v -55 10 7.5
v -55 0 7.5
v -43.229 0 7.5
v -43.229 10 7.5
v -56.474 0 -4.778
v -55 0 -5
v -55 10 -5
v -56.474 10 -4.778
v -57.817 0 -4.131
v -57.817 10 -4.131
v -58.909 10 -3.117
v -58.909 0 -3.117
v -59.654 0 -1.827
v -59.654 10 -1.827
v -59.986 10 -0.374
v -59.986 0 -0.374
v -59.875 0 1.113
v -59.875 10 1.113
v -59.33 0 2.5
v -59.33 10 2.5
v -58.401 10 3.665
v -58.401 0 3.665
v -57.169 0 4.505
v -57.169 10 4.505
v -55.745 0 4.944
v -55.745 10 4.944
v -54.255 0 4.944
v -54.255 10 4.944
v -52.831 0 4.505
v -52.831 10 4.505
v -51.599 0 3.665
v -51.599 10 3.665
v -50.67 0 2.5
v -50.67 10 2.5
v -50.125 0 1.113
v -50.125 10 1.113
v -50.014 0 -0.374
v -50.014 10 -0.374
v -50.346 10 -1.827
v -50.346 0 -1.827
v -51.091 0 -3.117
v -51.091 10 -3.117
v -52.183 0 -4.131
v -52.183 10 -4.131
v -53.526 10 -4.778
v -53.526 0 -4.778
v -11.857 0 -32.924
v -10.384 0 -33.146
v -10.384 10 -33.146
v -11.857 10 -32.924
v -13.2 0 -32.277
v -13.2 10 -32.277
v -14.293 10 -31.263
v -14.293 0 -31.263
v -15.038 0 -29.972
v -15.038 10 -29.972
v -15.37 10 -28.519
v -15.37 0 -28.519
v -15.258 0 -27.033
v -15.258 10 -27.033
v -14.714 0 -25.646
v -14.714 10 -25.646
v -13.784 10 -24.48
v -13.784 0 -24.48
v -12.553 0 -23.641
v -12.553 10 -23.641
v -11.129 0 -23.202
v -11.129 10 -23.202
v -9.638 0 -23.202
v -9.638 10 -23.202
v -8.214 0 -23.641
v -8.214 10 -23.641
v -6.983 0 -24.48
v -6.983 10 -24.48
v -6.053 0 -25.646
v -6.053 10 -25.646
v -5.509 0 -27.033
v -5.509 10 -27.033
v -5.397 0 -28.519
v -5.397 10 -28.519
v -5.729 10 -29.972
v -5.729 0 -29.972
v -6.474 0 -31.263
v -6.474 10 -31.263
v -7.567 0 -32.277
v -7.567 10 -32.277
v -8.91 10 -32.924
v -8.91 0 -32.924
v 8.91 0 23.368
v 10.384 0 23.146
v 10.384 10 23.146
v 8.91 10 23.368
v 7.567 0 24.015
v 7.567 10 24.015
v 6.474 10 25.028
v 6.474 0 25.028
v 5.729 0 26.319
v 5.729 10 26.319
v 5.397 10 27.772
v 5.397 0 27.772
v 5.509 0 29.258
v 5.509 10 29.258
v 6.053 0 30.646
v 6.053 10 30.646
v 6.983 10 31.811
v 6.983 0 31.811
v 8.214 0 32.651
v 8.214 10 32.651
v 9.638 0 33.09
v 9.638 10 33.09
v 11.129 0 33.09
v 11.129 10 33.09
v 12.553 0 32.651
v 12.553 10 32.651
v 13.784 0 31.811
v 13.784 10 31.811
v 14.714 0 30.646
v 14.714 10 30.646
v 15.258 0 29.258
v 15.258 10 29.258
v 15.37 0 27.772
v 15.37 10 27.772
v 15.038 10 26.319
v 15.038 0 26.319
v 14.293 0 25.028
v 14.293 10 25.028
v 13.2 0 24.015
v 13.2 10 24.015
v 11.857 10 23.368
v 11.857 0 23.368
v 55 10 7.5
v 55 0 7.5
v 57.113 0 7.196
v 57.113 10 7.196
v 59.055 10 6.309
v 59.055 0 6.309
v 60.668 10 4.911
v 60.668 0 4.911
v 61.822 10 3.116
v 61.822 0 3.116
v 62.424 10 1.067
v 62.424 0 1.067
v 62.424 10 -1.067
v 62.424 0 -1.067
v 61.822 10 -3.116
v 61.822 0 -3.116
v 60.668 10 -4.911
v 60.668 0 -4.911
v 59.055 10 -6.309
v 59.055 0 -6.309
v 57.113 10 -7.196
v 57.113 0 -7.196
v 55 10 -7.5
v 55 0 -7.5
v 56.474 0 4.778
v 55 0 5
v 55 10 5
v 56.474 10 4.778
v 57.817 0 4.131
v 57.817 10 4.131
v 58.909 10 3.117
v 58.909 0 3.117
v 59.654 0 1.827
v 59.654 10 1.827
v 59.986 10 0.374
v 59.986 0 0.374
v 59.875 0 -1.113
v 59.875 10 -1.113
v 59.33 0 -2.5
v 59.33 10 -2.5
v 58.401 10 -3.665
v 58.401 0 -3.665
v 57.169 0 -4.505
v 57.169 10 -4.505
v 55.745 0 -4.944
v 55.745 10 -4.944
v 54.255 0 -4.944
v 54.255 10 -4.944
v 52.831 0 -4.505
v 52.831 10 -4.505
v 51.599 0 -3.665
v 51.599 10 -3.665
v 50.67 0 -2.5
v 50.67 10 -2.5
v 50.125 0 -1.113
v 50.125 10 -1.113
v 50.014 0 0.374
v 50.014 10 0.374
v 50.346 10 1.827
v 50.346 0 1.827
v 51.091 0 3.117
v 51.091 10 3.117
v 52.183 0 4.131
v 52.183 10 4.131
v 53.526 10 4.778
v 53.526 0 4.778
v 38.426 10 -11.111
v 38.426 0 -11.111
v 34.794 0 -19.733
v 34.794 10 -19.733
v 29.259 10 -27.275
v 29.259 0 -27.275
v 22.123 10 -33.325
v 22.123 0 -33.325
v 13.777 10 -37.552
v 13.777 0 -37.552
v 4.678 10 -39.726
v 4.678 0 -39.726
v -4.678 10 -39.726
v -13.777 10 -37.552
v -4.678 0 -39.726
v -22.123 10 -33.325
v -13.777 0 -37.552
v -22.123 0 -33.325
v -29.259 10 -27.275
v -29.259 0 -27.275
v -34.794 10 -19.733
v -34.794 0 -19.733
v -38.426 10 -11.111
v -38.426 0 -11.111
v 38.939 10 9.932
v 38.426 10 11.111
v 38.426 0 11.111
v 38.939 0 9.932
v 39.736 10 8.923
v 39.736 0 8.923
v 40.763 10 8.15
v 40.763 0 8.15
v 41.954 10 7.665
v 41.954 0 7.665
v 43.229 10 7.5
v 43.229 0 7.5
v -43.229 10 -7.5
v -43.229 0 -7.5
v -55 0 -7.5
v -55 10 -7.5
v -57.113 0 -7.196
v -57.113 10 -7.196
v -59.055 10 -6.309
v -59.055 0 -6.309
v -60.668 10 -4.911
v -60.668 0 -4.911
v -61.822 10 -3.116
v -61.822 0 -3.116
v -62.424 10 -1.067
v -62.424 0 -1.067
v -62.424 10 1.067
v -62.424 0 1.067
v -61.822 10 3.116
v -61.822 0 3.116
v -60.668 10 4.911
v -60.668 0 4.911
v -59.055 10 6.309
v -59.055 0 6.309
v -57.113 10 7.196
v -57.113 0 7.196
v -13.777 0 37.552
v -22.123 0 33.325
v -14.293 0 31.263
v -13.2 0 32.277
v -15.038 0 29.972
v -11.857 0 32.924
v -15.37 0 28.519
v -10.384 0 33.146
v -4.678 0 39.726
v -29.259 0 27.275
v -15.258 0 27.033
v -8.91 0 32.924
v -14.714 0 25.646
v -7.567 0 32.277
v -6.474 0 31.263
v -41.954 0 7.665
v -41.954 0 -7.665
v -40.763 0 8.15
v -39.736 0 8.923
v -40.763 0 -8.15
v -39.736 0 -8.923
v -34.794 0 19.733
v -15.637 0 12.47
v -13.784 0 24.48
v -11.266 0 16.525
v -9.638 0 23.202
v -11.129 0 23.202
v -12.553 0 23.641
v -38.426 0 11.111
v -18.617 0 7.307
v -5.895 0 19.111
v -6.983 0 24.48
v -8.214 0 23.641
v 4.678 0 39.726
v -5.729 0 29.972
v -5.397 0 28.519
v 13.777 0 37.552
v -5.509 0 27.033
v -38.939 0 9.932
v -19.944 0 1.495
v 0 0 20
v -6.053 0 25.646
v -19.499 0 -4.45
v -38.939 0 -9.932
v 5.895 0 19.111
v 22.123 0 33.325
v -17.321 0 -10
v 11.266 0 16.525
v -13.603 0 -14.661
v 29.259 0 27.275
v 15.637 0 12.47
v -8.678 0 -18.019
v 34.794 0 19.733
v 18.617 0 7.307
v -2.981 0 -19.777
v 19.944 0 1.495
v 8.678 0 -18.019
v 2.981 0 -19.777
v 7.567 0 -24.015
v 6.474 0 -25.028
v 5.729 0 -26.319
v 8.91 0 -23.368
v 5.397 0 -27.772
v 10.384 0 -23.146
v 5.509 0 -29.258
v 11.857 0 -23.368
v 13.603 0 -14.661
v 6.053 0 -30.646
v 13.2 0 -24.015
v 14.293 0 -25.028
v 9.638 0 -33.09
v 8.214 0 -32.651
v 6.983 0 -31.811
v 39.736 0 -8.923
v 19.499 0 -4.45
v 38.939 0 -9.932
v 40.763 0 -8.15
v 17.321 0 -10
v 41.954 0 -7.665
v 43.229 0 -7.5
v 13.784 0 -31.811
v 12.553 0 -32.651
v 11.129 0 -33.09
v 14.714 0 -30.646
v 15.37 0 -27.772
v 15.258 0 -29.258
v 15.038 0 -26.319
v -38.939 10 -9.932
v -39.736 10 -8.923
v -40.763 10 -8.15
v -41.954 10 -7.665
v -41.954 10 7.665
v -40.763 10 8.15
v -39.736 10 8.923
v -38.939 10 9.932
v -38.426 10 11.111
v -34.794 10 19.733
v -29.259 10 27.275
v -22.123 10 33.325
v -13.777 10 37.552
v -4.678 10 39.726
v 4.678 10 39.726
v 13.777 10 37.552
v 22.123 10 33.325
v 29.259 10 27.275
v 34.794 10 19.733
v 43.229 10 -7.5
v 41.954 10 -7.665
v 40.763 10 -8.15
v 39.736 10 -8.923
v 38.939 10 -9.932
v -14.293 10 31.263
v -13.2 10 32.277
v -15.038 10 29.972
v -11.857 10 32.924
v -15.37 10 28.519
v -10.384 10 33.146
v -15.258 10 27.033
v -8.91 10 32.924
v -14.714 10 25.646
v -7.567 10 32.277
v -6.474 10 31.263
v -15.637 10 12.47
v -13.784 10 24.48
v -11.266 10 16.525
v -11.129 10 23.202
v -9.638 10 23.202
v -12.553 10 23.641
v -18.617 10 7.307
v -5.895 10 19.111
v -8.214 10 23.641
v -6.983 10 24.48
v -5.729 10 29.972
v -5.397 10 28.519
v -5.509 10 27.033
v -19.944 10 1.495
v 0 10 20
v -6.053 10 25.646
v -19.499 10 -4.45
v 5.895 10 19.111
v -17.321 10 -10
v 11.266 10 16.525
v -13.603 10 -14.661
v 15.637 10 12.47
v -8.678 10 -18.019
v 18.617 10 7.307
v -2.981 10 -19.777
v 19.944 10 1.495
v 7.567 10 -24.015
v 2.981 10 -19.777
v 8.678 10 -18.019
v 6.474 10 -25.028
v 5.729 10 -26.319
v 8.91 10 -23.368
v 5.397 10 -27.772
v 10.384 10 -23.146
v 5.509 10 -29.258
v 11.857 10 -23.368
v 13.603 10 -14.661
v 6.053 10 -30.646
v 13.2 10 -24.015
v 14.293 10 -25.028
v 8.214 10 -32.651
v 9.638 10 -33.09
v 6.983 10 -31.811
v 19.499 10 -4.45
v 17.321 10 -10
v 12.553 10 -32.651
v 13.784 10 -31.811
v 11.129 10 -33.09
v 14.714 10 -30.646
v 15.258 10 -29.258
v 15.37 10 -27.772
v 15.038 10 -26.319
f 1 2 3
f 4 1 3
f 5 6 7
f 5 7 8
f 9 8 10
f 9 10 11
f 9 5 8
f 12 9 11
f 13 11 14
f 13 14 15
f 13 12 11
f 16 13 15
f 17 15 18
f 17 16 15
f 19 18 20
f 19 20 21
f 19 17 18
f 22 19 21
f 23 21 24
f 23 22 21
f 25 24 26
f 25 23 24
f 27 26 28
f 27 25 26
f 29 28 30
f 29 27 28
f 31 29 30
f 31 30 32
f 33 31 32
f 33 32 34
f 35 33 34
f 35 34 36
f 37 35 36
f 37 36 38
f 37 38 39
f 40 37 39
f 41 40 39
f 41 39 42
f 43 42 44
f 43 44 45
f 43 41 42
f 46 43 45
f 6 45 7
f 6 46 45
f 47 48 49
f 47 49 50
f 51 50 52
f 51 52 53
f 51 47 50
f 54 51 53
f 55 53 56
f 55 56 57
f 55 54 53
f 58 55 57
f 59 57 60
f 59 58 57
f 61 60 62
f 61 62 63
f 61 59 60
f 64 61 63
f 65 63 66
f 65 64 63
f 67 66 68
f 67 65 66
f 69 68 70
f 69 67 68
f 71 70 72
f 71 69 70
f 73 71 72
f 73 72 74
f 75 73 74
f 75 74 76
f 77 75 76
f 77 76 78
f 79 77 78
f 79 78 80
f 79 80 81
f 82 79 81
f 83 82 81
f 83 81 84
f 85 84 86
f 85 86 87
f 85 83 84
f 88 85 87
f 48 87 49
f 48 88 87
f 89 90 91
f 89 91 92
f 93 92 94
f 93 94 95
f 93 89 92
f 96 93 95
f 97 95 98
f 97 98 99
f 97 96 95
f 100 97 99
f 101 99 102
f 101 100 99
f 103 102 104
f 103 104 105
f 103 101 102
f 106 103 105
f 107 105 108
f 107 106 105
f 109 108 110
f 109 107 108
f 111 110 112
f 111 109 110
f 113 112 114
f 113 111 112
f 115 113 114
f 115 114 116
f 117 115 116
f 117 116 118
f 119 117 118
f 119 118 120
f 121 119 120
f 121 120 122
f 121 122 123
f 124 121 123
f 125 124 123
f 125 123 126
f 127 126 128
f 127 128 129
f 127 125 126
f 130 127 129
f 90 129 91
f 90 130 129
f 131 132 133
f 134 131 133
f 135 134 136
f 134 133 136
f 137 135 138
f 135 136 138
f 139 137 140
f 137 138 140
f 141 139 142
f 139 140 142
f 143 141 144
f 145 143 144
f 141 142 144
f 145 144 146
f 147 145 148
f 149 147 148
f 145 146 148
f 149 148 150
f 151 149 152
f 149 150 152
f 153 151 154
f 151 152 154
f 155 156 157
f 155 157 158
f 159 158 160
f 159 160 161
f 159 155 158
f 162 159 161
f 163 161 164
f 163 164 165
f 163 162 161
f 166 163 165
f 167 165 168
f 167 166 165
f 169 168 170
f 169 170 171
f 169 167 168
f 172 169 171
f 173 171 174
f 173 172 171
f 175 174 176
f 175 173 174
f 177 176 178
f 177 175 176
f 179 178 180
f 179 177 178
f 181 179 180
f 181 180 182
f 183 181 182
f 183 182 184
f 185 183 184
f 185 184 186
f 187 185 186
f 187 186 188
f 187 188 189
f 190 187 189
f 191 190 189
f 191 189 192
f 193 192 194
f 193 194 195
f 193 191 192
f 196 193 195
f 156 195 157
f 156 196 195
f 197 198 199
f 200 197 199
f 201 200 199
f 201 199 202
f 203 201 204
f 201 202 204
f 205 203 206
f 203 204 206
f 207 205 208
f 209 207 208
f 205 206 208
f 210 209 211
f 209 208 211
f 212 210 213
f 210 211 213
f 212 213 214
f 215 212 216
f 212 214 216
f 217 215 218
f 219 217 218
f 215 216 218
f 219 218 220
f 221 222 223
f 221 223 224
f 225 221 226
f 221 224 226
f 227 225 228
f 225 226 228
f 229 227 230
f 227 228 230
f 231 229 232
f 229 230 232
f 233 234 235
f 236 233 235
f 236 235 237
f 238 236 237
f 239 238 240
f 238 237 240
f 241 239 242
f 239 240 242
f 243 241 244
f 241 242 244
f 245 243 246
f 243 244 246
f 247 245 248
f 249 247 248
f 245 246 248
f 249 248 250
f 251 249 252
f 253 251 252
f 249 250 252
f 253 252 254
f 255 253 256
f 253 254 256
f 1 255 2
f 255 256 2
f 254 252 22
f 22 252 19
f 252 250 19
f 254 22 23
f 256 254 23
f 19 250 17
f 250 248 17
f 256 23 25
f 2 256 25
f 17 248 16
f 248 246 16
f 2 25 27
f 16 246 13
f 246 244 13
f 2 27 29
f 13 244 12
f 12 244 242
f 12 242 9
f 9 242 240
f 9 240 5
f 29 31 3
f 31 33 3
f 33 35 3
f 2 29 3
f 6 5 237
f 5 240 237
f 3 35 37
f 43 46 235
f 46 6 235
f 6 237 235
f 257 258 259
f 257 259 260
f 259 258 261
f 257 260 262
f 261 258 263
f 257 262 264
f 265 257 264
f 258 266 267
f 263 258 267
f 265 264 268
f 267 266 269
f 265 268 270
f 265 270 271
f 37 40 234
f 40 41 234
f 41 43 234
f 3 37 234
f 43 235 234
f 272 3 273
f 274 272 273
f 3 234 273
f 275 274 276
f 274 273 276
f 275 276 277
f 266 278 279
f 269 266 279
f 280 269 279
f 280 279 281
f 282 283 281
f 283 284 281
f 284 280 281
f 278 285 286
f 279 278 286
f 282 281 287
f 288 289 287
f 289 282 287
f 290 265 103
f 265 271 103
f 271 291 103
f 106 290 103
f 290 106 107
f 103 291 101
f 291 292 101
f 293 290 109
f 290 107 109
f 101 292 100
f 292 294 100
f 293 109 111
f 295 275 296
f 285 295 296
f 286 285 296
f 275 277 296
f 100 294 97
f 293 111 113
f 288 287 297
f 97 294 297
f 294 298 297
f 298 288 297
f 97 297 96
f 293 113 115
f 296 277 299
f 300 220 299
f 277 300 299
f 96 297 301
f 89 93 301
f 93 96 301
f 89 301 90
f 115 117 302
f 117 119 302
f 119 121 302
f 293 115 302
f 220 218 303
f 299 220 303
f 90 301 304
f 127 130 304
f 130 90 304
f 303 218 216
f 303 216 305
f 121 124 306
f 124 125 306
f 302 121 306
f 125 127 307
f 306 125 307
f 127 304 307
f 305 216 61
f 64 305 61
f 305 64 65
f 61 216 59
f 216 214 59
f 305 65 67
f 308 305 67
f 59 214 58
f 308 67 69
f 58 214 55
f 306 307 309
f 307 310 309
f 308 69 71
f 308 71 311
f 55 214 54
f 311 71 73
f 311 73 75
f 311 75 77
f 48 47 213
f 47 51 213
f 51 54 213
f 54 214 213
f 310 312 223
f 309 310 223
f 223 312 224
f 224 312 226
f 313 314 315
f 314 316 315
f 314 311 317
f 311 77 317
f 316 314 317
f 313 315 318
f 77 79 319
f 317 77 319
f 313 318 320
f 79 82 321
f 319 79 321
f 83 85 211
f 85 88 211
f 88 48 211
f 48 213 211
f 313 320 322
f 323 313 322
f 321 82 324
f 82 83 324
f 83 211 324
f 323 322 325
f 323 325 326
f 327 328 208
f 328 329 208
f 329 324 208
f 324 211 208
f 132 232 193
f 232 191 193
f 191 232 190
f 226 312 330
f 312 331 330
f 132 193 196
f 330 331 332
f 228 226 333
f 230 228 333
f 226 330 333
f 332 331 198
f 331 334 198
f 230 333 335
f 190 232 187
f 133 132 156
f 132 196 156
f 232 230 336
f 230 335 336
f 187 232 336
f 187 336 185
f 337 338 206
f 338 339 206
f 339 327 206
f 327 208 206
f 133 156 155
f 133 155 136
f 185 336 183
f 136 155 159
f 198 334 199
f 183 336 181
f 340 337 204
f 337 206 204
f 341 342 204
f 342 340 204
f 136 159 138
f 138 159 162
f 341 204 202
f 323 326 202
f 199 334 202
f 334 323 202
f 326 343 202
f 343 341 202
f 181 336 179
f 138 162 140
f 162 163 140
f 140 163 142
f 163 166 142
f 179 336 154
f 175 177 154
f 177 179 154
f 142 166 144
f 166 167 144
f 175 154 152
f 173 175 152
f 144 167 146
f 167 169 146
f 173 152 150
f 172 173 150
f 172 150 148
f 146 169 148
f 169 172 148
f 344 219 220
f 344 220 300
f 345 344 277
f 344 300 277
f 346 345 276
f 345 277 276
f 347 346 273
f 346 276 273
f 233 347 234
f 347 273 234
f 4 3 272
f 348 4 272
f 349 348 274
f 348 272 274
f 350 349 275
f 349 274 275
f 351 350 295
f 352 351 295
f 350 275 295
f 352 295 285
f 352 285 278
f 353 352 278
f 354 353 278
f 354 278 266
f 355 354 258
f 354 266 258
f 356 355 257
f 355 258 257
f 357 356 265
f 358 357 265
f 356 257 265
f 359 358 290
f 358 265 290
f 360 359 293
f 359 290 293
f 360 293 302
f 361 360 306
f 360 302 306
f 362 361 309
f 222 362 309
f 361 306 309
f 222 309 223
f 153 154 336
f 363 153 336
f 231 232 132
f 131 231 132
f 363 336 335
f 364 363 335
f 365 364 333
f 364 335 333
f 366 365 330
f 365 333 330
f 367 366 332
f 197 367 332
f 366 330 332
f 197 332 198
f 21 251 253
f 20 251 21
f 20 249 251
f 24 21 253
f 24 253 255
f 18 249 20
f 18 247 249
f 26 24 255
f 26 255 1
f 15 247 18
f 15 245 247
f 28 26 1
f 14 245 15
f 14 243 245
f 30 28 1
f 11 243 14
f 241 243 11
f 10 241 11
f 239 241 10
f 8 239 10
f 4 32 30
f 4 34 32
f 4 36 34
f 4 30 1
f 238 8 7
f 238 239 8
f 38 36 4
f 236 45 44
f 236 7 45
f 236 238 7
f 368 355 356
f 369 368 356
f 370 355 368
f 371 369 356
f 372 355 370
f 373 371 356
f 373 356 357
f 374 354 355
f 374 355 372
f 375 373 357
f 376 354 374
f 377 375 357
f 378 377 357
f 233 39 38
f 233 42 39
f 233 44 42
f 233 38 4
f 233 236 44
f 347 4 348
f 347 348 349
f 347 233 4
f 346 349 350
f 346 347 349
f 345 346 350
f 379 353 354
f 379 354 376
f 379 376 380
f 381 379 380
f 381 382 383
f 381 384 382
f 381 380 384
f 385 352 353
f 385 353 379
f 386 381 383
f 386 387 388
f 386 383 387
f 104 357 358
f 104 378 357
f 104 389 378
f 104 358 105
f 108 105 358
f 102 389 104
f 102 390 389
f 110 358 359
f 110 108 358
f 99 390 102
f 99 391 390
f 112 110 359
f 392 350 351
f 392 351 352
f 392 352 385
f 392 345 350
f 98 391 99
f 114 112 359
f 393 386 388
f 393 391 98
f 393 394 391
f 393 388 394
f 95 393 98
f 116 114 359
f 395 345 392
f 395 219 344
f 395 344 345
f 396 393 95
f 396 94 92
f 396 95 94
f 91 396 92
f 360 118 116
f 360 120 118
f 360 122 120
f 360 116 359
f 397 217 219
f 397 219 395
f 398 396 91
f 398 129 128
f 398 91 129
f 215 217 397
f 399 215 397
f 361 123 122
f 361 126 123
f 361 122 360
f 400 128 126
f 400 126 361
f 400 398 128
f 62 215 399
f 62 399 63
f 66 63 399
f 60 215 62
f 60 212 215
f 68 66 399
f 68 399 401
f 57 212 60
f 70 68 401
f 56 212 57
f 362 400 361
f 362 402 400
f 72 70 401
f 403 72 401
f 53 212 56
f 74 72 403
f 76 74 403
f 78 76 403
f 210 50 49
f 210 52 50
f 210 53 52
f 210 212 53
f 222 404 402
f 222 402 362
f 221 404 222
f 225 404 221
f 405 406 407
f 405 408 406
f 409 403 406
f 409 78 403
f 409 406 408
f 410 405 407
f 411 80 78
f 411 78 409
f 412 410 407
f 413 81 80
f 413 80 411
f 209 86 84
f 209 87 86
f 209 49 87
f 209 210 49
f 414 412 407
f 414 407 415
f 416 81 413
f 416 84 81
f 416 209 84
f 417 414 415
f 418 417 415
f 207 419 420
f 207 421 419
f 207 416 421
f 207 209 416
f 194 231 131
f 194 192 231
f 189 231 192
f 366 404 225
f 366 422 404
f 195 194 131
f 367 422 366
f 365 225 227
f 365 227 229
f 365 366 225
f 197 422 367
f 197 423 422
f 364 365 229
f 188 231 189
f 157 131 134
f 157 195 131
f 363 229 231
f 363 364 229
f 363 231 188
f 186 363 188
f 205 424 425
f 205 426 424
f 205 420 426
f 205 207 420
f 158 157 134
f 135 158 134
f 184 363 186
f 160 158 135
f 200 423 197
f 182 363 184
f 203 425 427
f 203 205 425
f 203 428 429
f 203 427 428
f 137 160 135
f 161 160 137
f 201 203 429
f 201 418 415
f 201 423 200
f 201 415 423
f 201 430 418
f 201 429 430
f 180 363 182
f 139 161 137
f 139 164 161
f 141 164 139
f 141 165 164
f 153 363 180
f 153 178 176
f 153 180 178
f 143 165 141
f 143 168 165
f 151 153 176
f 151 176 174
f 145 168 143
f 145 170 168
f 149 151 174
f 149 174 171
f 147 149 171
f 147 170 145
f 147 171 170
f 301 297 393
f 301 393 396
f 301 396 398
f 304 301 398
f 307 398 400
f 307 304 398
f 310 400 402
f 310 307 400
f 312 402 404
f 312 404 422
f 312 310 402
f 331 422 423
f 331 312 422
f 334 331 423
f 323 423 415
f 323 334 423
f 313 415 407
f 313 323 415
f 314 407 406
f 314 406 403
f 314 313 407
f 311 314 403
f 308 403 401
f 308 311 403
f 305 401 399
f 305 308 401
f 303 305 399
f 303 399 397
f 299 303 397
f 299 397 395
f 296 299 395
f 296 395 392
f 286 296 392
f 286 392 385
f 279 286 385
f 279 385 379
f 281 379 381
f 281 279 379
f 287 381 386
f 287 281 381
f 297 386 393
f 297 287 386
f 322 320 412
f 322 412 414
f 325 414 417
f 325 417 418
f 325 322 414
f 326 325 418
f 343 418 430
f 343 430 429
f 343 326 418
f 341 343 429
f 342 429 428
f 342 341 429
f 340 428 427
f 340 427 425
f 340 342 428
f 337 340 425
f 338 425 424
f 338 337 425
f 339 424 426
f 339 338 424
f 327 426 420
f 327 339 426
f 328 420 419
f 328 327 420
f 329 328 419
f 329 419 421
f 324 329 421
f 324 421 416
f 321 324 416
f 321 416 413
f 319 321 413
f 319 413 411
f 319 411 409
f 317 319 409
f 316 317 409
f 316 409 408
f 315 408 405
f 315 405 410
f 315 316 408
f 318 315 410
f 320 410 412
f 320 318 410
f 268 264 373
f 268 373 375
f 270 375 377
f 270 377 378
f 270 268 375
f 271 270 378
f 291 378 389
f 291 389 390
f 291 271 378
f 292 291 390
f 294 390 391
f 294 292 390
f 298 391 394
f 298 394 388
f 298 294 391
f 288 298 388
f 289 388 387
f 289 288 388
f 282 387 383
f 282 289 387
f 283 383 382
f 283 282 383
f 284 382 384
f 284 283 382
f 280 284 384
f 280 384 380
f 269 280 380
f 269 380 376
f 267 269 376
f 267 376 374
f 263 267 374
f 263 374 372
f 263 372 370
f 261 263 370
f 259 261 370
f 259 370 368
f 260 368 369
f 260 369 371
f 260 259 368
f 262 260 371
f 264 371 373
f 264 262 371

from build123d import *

# Parameters (mm, degrees)
SKETCH1_R           = 20
SKETCH1_R_2         = 5
BOSS_EXTRUDE2_DEPTH = 10


with BuildPart() as part:
    # Sketch1 → Boss-Extrude2 (new body)
    with BuildSketch(Plane(origin=(0, 0, 0), x_dir=(1, 0, 0), z_dir=(0, 1, 0))):
        with BuildLine():
            Line((-55, -7.5), (-43.229041164, -7.5))
            ThreePointArc((-43.229041164, -7.5), (-40.224415102, -8.503473731), (-38.425814368, -11.111111111))
            ThreePointArc((-38.425814368, -11.111111111), (0, -40), (38.425814368, -11.111111111))
            ThreePointArc((38.425814368, -11.111111111), (40.224415102, -8.503473731), (43.229041164, -7.5))
            Line((43.229041164, -7.5), (55, -7.5))
            ThreePointArc((55, -7.5), (62.5, 0), (55, 7.5))
            Line((55, 7.5), (43.229041164, 7.5))
            ThreePointArc((43.229041164, 7.5), (40.224415102, 8.503473731), (38.425814368, 11.111111111))
            ThreePointArc((38.425814368, 11.111111111), (0, 40), (-38.425814368, 11.111111111))
            ThreePointArc((-38.425814368, 11.111111111), (-40.224415102, 8.503473731), (-43.229041164, 7.5))
            Line((-43.229041164, 7.5), (-55, 7.5))
            ThreePointArc((-55, 7.5), (-62.5, 0), (-55, -7.5))
        make_face()
        with Locations(Location((0, 0, 0), (0, 0, 270))):
            Circle(SKETCH1_R, mode=Mode.SUBTRACT)
        with Locations(Location((55, 0, 0), (0, 0, 270))):
            Circle(SKETCH1_R_2, mode=Mode.SUBTRACT)
        with Locations(Location((-55, 0, 0), (0, 0, 90))):
            Circle(SKETCH1_R_2, mode=Mode.SUBTRACT)
        with Locations(Location((10.383511712, 28.145740078, 0), (0, 0, 270))):
            Circle(SKETCH1_R_2, mode=Mode.SUBTRACT)
        with Locations(Location((-10.383511712, 28.145740078, 0), (0, 0, 90))):
            Circle(SKETCH1_R_2, mode=Mode.SUBTRACT)
        with Locations(Location((10.383511712, -28.145740078, 0), (0, 0, 90))):
            Circle(SKETCH1_R_2, mode=Mode.SUBTRACT)
        with Locations(Location((-10.383511712, -28.145740078, 0), (0, 0, 270))):
            Circle(SKETCH1_R_2, mode=Mode.SUBTRACT)
    extrude(amount=BOSS_EXTRUDE2_DEPTH)


solid = part.part
